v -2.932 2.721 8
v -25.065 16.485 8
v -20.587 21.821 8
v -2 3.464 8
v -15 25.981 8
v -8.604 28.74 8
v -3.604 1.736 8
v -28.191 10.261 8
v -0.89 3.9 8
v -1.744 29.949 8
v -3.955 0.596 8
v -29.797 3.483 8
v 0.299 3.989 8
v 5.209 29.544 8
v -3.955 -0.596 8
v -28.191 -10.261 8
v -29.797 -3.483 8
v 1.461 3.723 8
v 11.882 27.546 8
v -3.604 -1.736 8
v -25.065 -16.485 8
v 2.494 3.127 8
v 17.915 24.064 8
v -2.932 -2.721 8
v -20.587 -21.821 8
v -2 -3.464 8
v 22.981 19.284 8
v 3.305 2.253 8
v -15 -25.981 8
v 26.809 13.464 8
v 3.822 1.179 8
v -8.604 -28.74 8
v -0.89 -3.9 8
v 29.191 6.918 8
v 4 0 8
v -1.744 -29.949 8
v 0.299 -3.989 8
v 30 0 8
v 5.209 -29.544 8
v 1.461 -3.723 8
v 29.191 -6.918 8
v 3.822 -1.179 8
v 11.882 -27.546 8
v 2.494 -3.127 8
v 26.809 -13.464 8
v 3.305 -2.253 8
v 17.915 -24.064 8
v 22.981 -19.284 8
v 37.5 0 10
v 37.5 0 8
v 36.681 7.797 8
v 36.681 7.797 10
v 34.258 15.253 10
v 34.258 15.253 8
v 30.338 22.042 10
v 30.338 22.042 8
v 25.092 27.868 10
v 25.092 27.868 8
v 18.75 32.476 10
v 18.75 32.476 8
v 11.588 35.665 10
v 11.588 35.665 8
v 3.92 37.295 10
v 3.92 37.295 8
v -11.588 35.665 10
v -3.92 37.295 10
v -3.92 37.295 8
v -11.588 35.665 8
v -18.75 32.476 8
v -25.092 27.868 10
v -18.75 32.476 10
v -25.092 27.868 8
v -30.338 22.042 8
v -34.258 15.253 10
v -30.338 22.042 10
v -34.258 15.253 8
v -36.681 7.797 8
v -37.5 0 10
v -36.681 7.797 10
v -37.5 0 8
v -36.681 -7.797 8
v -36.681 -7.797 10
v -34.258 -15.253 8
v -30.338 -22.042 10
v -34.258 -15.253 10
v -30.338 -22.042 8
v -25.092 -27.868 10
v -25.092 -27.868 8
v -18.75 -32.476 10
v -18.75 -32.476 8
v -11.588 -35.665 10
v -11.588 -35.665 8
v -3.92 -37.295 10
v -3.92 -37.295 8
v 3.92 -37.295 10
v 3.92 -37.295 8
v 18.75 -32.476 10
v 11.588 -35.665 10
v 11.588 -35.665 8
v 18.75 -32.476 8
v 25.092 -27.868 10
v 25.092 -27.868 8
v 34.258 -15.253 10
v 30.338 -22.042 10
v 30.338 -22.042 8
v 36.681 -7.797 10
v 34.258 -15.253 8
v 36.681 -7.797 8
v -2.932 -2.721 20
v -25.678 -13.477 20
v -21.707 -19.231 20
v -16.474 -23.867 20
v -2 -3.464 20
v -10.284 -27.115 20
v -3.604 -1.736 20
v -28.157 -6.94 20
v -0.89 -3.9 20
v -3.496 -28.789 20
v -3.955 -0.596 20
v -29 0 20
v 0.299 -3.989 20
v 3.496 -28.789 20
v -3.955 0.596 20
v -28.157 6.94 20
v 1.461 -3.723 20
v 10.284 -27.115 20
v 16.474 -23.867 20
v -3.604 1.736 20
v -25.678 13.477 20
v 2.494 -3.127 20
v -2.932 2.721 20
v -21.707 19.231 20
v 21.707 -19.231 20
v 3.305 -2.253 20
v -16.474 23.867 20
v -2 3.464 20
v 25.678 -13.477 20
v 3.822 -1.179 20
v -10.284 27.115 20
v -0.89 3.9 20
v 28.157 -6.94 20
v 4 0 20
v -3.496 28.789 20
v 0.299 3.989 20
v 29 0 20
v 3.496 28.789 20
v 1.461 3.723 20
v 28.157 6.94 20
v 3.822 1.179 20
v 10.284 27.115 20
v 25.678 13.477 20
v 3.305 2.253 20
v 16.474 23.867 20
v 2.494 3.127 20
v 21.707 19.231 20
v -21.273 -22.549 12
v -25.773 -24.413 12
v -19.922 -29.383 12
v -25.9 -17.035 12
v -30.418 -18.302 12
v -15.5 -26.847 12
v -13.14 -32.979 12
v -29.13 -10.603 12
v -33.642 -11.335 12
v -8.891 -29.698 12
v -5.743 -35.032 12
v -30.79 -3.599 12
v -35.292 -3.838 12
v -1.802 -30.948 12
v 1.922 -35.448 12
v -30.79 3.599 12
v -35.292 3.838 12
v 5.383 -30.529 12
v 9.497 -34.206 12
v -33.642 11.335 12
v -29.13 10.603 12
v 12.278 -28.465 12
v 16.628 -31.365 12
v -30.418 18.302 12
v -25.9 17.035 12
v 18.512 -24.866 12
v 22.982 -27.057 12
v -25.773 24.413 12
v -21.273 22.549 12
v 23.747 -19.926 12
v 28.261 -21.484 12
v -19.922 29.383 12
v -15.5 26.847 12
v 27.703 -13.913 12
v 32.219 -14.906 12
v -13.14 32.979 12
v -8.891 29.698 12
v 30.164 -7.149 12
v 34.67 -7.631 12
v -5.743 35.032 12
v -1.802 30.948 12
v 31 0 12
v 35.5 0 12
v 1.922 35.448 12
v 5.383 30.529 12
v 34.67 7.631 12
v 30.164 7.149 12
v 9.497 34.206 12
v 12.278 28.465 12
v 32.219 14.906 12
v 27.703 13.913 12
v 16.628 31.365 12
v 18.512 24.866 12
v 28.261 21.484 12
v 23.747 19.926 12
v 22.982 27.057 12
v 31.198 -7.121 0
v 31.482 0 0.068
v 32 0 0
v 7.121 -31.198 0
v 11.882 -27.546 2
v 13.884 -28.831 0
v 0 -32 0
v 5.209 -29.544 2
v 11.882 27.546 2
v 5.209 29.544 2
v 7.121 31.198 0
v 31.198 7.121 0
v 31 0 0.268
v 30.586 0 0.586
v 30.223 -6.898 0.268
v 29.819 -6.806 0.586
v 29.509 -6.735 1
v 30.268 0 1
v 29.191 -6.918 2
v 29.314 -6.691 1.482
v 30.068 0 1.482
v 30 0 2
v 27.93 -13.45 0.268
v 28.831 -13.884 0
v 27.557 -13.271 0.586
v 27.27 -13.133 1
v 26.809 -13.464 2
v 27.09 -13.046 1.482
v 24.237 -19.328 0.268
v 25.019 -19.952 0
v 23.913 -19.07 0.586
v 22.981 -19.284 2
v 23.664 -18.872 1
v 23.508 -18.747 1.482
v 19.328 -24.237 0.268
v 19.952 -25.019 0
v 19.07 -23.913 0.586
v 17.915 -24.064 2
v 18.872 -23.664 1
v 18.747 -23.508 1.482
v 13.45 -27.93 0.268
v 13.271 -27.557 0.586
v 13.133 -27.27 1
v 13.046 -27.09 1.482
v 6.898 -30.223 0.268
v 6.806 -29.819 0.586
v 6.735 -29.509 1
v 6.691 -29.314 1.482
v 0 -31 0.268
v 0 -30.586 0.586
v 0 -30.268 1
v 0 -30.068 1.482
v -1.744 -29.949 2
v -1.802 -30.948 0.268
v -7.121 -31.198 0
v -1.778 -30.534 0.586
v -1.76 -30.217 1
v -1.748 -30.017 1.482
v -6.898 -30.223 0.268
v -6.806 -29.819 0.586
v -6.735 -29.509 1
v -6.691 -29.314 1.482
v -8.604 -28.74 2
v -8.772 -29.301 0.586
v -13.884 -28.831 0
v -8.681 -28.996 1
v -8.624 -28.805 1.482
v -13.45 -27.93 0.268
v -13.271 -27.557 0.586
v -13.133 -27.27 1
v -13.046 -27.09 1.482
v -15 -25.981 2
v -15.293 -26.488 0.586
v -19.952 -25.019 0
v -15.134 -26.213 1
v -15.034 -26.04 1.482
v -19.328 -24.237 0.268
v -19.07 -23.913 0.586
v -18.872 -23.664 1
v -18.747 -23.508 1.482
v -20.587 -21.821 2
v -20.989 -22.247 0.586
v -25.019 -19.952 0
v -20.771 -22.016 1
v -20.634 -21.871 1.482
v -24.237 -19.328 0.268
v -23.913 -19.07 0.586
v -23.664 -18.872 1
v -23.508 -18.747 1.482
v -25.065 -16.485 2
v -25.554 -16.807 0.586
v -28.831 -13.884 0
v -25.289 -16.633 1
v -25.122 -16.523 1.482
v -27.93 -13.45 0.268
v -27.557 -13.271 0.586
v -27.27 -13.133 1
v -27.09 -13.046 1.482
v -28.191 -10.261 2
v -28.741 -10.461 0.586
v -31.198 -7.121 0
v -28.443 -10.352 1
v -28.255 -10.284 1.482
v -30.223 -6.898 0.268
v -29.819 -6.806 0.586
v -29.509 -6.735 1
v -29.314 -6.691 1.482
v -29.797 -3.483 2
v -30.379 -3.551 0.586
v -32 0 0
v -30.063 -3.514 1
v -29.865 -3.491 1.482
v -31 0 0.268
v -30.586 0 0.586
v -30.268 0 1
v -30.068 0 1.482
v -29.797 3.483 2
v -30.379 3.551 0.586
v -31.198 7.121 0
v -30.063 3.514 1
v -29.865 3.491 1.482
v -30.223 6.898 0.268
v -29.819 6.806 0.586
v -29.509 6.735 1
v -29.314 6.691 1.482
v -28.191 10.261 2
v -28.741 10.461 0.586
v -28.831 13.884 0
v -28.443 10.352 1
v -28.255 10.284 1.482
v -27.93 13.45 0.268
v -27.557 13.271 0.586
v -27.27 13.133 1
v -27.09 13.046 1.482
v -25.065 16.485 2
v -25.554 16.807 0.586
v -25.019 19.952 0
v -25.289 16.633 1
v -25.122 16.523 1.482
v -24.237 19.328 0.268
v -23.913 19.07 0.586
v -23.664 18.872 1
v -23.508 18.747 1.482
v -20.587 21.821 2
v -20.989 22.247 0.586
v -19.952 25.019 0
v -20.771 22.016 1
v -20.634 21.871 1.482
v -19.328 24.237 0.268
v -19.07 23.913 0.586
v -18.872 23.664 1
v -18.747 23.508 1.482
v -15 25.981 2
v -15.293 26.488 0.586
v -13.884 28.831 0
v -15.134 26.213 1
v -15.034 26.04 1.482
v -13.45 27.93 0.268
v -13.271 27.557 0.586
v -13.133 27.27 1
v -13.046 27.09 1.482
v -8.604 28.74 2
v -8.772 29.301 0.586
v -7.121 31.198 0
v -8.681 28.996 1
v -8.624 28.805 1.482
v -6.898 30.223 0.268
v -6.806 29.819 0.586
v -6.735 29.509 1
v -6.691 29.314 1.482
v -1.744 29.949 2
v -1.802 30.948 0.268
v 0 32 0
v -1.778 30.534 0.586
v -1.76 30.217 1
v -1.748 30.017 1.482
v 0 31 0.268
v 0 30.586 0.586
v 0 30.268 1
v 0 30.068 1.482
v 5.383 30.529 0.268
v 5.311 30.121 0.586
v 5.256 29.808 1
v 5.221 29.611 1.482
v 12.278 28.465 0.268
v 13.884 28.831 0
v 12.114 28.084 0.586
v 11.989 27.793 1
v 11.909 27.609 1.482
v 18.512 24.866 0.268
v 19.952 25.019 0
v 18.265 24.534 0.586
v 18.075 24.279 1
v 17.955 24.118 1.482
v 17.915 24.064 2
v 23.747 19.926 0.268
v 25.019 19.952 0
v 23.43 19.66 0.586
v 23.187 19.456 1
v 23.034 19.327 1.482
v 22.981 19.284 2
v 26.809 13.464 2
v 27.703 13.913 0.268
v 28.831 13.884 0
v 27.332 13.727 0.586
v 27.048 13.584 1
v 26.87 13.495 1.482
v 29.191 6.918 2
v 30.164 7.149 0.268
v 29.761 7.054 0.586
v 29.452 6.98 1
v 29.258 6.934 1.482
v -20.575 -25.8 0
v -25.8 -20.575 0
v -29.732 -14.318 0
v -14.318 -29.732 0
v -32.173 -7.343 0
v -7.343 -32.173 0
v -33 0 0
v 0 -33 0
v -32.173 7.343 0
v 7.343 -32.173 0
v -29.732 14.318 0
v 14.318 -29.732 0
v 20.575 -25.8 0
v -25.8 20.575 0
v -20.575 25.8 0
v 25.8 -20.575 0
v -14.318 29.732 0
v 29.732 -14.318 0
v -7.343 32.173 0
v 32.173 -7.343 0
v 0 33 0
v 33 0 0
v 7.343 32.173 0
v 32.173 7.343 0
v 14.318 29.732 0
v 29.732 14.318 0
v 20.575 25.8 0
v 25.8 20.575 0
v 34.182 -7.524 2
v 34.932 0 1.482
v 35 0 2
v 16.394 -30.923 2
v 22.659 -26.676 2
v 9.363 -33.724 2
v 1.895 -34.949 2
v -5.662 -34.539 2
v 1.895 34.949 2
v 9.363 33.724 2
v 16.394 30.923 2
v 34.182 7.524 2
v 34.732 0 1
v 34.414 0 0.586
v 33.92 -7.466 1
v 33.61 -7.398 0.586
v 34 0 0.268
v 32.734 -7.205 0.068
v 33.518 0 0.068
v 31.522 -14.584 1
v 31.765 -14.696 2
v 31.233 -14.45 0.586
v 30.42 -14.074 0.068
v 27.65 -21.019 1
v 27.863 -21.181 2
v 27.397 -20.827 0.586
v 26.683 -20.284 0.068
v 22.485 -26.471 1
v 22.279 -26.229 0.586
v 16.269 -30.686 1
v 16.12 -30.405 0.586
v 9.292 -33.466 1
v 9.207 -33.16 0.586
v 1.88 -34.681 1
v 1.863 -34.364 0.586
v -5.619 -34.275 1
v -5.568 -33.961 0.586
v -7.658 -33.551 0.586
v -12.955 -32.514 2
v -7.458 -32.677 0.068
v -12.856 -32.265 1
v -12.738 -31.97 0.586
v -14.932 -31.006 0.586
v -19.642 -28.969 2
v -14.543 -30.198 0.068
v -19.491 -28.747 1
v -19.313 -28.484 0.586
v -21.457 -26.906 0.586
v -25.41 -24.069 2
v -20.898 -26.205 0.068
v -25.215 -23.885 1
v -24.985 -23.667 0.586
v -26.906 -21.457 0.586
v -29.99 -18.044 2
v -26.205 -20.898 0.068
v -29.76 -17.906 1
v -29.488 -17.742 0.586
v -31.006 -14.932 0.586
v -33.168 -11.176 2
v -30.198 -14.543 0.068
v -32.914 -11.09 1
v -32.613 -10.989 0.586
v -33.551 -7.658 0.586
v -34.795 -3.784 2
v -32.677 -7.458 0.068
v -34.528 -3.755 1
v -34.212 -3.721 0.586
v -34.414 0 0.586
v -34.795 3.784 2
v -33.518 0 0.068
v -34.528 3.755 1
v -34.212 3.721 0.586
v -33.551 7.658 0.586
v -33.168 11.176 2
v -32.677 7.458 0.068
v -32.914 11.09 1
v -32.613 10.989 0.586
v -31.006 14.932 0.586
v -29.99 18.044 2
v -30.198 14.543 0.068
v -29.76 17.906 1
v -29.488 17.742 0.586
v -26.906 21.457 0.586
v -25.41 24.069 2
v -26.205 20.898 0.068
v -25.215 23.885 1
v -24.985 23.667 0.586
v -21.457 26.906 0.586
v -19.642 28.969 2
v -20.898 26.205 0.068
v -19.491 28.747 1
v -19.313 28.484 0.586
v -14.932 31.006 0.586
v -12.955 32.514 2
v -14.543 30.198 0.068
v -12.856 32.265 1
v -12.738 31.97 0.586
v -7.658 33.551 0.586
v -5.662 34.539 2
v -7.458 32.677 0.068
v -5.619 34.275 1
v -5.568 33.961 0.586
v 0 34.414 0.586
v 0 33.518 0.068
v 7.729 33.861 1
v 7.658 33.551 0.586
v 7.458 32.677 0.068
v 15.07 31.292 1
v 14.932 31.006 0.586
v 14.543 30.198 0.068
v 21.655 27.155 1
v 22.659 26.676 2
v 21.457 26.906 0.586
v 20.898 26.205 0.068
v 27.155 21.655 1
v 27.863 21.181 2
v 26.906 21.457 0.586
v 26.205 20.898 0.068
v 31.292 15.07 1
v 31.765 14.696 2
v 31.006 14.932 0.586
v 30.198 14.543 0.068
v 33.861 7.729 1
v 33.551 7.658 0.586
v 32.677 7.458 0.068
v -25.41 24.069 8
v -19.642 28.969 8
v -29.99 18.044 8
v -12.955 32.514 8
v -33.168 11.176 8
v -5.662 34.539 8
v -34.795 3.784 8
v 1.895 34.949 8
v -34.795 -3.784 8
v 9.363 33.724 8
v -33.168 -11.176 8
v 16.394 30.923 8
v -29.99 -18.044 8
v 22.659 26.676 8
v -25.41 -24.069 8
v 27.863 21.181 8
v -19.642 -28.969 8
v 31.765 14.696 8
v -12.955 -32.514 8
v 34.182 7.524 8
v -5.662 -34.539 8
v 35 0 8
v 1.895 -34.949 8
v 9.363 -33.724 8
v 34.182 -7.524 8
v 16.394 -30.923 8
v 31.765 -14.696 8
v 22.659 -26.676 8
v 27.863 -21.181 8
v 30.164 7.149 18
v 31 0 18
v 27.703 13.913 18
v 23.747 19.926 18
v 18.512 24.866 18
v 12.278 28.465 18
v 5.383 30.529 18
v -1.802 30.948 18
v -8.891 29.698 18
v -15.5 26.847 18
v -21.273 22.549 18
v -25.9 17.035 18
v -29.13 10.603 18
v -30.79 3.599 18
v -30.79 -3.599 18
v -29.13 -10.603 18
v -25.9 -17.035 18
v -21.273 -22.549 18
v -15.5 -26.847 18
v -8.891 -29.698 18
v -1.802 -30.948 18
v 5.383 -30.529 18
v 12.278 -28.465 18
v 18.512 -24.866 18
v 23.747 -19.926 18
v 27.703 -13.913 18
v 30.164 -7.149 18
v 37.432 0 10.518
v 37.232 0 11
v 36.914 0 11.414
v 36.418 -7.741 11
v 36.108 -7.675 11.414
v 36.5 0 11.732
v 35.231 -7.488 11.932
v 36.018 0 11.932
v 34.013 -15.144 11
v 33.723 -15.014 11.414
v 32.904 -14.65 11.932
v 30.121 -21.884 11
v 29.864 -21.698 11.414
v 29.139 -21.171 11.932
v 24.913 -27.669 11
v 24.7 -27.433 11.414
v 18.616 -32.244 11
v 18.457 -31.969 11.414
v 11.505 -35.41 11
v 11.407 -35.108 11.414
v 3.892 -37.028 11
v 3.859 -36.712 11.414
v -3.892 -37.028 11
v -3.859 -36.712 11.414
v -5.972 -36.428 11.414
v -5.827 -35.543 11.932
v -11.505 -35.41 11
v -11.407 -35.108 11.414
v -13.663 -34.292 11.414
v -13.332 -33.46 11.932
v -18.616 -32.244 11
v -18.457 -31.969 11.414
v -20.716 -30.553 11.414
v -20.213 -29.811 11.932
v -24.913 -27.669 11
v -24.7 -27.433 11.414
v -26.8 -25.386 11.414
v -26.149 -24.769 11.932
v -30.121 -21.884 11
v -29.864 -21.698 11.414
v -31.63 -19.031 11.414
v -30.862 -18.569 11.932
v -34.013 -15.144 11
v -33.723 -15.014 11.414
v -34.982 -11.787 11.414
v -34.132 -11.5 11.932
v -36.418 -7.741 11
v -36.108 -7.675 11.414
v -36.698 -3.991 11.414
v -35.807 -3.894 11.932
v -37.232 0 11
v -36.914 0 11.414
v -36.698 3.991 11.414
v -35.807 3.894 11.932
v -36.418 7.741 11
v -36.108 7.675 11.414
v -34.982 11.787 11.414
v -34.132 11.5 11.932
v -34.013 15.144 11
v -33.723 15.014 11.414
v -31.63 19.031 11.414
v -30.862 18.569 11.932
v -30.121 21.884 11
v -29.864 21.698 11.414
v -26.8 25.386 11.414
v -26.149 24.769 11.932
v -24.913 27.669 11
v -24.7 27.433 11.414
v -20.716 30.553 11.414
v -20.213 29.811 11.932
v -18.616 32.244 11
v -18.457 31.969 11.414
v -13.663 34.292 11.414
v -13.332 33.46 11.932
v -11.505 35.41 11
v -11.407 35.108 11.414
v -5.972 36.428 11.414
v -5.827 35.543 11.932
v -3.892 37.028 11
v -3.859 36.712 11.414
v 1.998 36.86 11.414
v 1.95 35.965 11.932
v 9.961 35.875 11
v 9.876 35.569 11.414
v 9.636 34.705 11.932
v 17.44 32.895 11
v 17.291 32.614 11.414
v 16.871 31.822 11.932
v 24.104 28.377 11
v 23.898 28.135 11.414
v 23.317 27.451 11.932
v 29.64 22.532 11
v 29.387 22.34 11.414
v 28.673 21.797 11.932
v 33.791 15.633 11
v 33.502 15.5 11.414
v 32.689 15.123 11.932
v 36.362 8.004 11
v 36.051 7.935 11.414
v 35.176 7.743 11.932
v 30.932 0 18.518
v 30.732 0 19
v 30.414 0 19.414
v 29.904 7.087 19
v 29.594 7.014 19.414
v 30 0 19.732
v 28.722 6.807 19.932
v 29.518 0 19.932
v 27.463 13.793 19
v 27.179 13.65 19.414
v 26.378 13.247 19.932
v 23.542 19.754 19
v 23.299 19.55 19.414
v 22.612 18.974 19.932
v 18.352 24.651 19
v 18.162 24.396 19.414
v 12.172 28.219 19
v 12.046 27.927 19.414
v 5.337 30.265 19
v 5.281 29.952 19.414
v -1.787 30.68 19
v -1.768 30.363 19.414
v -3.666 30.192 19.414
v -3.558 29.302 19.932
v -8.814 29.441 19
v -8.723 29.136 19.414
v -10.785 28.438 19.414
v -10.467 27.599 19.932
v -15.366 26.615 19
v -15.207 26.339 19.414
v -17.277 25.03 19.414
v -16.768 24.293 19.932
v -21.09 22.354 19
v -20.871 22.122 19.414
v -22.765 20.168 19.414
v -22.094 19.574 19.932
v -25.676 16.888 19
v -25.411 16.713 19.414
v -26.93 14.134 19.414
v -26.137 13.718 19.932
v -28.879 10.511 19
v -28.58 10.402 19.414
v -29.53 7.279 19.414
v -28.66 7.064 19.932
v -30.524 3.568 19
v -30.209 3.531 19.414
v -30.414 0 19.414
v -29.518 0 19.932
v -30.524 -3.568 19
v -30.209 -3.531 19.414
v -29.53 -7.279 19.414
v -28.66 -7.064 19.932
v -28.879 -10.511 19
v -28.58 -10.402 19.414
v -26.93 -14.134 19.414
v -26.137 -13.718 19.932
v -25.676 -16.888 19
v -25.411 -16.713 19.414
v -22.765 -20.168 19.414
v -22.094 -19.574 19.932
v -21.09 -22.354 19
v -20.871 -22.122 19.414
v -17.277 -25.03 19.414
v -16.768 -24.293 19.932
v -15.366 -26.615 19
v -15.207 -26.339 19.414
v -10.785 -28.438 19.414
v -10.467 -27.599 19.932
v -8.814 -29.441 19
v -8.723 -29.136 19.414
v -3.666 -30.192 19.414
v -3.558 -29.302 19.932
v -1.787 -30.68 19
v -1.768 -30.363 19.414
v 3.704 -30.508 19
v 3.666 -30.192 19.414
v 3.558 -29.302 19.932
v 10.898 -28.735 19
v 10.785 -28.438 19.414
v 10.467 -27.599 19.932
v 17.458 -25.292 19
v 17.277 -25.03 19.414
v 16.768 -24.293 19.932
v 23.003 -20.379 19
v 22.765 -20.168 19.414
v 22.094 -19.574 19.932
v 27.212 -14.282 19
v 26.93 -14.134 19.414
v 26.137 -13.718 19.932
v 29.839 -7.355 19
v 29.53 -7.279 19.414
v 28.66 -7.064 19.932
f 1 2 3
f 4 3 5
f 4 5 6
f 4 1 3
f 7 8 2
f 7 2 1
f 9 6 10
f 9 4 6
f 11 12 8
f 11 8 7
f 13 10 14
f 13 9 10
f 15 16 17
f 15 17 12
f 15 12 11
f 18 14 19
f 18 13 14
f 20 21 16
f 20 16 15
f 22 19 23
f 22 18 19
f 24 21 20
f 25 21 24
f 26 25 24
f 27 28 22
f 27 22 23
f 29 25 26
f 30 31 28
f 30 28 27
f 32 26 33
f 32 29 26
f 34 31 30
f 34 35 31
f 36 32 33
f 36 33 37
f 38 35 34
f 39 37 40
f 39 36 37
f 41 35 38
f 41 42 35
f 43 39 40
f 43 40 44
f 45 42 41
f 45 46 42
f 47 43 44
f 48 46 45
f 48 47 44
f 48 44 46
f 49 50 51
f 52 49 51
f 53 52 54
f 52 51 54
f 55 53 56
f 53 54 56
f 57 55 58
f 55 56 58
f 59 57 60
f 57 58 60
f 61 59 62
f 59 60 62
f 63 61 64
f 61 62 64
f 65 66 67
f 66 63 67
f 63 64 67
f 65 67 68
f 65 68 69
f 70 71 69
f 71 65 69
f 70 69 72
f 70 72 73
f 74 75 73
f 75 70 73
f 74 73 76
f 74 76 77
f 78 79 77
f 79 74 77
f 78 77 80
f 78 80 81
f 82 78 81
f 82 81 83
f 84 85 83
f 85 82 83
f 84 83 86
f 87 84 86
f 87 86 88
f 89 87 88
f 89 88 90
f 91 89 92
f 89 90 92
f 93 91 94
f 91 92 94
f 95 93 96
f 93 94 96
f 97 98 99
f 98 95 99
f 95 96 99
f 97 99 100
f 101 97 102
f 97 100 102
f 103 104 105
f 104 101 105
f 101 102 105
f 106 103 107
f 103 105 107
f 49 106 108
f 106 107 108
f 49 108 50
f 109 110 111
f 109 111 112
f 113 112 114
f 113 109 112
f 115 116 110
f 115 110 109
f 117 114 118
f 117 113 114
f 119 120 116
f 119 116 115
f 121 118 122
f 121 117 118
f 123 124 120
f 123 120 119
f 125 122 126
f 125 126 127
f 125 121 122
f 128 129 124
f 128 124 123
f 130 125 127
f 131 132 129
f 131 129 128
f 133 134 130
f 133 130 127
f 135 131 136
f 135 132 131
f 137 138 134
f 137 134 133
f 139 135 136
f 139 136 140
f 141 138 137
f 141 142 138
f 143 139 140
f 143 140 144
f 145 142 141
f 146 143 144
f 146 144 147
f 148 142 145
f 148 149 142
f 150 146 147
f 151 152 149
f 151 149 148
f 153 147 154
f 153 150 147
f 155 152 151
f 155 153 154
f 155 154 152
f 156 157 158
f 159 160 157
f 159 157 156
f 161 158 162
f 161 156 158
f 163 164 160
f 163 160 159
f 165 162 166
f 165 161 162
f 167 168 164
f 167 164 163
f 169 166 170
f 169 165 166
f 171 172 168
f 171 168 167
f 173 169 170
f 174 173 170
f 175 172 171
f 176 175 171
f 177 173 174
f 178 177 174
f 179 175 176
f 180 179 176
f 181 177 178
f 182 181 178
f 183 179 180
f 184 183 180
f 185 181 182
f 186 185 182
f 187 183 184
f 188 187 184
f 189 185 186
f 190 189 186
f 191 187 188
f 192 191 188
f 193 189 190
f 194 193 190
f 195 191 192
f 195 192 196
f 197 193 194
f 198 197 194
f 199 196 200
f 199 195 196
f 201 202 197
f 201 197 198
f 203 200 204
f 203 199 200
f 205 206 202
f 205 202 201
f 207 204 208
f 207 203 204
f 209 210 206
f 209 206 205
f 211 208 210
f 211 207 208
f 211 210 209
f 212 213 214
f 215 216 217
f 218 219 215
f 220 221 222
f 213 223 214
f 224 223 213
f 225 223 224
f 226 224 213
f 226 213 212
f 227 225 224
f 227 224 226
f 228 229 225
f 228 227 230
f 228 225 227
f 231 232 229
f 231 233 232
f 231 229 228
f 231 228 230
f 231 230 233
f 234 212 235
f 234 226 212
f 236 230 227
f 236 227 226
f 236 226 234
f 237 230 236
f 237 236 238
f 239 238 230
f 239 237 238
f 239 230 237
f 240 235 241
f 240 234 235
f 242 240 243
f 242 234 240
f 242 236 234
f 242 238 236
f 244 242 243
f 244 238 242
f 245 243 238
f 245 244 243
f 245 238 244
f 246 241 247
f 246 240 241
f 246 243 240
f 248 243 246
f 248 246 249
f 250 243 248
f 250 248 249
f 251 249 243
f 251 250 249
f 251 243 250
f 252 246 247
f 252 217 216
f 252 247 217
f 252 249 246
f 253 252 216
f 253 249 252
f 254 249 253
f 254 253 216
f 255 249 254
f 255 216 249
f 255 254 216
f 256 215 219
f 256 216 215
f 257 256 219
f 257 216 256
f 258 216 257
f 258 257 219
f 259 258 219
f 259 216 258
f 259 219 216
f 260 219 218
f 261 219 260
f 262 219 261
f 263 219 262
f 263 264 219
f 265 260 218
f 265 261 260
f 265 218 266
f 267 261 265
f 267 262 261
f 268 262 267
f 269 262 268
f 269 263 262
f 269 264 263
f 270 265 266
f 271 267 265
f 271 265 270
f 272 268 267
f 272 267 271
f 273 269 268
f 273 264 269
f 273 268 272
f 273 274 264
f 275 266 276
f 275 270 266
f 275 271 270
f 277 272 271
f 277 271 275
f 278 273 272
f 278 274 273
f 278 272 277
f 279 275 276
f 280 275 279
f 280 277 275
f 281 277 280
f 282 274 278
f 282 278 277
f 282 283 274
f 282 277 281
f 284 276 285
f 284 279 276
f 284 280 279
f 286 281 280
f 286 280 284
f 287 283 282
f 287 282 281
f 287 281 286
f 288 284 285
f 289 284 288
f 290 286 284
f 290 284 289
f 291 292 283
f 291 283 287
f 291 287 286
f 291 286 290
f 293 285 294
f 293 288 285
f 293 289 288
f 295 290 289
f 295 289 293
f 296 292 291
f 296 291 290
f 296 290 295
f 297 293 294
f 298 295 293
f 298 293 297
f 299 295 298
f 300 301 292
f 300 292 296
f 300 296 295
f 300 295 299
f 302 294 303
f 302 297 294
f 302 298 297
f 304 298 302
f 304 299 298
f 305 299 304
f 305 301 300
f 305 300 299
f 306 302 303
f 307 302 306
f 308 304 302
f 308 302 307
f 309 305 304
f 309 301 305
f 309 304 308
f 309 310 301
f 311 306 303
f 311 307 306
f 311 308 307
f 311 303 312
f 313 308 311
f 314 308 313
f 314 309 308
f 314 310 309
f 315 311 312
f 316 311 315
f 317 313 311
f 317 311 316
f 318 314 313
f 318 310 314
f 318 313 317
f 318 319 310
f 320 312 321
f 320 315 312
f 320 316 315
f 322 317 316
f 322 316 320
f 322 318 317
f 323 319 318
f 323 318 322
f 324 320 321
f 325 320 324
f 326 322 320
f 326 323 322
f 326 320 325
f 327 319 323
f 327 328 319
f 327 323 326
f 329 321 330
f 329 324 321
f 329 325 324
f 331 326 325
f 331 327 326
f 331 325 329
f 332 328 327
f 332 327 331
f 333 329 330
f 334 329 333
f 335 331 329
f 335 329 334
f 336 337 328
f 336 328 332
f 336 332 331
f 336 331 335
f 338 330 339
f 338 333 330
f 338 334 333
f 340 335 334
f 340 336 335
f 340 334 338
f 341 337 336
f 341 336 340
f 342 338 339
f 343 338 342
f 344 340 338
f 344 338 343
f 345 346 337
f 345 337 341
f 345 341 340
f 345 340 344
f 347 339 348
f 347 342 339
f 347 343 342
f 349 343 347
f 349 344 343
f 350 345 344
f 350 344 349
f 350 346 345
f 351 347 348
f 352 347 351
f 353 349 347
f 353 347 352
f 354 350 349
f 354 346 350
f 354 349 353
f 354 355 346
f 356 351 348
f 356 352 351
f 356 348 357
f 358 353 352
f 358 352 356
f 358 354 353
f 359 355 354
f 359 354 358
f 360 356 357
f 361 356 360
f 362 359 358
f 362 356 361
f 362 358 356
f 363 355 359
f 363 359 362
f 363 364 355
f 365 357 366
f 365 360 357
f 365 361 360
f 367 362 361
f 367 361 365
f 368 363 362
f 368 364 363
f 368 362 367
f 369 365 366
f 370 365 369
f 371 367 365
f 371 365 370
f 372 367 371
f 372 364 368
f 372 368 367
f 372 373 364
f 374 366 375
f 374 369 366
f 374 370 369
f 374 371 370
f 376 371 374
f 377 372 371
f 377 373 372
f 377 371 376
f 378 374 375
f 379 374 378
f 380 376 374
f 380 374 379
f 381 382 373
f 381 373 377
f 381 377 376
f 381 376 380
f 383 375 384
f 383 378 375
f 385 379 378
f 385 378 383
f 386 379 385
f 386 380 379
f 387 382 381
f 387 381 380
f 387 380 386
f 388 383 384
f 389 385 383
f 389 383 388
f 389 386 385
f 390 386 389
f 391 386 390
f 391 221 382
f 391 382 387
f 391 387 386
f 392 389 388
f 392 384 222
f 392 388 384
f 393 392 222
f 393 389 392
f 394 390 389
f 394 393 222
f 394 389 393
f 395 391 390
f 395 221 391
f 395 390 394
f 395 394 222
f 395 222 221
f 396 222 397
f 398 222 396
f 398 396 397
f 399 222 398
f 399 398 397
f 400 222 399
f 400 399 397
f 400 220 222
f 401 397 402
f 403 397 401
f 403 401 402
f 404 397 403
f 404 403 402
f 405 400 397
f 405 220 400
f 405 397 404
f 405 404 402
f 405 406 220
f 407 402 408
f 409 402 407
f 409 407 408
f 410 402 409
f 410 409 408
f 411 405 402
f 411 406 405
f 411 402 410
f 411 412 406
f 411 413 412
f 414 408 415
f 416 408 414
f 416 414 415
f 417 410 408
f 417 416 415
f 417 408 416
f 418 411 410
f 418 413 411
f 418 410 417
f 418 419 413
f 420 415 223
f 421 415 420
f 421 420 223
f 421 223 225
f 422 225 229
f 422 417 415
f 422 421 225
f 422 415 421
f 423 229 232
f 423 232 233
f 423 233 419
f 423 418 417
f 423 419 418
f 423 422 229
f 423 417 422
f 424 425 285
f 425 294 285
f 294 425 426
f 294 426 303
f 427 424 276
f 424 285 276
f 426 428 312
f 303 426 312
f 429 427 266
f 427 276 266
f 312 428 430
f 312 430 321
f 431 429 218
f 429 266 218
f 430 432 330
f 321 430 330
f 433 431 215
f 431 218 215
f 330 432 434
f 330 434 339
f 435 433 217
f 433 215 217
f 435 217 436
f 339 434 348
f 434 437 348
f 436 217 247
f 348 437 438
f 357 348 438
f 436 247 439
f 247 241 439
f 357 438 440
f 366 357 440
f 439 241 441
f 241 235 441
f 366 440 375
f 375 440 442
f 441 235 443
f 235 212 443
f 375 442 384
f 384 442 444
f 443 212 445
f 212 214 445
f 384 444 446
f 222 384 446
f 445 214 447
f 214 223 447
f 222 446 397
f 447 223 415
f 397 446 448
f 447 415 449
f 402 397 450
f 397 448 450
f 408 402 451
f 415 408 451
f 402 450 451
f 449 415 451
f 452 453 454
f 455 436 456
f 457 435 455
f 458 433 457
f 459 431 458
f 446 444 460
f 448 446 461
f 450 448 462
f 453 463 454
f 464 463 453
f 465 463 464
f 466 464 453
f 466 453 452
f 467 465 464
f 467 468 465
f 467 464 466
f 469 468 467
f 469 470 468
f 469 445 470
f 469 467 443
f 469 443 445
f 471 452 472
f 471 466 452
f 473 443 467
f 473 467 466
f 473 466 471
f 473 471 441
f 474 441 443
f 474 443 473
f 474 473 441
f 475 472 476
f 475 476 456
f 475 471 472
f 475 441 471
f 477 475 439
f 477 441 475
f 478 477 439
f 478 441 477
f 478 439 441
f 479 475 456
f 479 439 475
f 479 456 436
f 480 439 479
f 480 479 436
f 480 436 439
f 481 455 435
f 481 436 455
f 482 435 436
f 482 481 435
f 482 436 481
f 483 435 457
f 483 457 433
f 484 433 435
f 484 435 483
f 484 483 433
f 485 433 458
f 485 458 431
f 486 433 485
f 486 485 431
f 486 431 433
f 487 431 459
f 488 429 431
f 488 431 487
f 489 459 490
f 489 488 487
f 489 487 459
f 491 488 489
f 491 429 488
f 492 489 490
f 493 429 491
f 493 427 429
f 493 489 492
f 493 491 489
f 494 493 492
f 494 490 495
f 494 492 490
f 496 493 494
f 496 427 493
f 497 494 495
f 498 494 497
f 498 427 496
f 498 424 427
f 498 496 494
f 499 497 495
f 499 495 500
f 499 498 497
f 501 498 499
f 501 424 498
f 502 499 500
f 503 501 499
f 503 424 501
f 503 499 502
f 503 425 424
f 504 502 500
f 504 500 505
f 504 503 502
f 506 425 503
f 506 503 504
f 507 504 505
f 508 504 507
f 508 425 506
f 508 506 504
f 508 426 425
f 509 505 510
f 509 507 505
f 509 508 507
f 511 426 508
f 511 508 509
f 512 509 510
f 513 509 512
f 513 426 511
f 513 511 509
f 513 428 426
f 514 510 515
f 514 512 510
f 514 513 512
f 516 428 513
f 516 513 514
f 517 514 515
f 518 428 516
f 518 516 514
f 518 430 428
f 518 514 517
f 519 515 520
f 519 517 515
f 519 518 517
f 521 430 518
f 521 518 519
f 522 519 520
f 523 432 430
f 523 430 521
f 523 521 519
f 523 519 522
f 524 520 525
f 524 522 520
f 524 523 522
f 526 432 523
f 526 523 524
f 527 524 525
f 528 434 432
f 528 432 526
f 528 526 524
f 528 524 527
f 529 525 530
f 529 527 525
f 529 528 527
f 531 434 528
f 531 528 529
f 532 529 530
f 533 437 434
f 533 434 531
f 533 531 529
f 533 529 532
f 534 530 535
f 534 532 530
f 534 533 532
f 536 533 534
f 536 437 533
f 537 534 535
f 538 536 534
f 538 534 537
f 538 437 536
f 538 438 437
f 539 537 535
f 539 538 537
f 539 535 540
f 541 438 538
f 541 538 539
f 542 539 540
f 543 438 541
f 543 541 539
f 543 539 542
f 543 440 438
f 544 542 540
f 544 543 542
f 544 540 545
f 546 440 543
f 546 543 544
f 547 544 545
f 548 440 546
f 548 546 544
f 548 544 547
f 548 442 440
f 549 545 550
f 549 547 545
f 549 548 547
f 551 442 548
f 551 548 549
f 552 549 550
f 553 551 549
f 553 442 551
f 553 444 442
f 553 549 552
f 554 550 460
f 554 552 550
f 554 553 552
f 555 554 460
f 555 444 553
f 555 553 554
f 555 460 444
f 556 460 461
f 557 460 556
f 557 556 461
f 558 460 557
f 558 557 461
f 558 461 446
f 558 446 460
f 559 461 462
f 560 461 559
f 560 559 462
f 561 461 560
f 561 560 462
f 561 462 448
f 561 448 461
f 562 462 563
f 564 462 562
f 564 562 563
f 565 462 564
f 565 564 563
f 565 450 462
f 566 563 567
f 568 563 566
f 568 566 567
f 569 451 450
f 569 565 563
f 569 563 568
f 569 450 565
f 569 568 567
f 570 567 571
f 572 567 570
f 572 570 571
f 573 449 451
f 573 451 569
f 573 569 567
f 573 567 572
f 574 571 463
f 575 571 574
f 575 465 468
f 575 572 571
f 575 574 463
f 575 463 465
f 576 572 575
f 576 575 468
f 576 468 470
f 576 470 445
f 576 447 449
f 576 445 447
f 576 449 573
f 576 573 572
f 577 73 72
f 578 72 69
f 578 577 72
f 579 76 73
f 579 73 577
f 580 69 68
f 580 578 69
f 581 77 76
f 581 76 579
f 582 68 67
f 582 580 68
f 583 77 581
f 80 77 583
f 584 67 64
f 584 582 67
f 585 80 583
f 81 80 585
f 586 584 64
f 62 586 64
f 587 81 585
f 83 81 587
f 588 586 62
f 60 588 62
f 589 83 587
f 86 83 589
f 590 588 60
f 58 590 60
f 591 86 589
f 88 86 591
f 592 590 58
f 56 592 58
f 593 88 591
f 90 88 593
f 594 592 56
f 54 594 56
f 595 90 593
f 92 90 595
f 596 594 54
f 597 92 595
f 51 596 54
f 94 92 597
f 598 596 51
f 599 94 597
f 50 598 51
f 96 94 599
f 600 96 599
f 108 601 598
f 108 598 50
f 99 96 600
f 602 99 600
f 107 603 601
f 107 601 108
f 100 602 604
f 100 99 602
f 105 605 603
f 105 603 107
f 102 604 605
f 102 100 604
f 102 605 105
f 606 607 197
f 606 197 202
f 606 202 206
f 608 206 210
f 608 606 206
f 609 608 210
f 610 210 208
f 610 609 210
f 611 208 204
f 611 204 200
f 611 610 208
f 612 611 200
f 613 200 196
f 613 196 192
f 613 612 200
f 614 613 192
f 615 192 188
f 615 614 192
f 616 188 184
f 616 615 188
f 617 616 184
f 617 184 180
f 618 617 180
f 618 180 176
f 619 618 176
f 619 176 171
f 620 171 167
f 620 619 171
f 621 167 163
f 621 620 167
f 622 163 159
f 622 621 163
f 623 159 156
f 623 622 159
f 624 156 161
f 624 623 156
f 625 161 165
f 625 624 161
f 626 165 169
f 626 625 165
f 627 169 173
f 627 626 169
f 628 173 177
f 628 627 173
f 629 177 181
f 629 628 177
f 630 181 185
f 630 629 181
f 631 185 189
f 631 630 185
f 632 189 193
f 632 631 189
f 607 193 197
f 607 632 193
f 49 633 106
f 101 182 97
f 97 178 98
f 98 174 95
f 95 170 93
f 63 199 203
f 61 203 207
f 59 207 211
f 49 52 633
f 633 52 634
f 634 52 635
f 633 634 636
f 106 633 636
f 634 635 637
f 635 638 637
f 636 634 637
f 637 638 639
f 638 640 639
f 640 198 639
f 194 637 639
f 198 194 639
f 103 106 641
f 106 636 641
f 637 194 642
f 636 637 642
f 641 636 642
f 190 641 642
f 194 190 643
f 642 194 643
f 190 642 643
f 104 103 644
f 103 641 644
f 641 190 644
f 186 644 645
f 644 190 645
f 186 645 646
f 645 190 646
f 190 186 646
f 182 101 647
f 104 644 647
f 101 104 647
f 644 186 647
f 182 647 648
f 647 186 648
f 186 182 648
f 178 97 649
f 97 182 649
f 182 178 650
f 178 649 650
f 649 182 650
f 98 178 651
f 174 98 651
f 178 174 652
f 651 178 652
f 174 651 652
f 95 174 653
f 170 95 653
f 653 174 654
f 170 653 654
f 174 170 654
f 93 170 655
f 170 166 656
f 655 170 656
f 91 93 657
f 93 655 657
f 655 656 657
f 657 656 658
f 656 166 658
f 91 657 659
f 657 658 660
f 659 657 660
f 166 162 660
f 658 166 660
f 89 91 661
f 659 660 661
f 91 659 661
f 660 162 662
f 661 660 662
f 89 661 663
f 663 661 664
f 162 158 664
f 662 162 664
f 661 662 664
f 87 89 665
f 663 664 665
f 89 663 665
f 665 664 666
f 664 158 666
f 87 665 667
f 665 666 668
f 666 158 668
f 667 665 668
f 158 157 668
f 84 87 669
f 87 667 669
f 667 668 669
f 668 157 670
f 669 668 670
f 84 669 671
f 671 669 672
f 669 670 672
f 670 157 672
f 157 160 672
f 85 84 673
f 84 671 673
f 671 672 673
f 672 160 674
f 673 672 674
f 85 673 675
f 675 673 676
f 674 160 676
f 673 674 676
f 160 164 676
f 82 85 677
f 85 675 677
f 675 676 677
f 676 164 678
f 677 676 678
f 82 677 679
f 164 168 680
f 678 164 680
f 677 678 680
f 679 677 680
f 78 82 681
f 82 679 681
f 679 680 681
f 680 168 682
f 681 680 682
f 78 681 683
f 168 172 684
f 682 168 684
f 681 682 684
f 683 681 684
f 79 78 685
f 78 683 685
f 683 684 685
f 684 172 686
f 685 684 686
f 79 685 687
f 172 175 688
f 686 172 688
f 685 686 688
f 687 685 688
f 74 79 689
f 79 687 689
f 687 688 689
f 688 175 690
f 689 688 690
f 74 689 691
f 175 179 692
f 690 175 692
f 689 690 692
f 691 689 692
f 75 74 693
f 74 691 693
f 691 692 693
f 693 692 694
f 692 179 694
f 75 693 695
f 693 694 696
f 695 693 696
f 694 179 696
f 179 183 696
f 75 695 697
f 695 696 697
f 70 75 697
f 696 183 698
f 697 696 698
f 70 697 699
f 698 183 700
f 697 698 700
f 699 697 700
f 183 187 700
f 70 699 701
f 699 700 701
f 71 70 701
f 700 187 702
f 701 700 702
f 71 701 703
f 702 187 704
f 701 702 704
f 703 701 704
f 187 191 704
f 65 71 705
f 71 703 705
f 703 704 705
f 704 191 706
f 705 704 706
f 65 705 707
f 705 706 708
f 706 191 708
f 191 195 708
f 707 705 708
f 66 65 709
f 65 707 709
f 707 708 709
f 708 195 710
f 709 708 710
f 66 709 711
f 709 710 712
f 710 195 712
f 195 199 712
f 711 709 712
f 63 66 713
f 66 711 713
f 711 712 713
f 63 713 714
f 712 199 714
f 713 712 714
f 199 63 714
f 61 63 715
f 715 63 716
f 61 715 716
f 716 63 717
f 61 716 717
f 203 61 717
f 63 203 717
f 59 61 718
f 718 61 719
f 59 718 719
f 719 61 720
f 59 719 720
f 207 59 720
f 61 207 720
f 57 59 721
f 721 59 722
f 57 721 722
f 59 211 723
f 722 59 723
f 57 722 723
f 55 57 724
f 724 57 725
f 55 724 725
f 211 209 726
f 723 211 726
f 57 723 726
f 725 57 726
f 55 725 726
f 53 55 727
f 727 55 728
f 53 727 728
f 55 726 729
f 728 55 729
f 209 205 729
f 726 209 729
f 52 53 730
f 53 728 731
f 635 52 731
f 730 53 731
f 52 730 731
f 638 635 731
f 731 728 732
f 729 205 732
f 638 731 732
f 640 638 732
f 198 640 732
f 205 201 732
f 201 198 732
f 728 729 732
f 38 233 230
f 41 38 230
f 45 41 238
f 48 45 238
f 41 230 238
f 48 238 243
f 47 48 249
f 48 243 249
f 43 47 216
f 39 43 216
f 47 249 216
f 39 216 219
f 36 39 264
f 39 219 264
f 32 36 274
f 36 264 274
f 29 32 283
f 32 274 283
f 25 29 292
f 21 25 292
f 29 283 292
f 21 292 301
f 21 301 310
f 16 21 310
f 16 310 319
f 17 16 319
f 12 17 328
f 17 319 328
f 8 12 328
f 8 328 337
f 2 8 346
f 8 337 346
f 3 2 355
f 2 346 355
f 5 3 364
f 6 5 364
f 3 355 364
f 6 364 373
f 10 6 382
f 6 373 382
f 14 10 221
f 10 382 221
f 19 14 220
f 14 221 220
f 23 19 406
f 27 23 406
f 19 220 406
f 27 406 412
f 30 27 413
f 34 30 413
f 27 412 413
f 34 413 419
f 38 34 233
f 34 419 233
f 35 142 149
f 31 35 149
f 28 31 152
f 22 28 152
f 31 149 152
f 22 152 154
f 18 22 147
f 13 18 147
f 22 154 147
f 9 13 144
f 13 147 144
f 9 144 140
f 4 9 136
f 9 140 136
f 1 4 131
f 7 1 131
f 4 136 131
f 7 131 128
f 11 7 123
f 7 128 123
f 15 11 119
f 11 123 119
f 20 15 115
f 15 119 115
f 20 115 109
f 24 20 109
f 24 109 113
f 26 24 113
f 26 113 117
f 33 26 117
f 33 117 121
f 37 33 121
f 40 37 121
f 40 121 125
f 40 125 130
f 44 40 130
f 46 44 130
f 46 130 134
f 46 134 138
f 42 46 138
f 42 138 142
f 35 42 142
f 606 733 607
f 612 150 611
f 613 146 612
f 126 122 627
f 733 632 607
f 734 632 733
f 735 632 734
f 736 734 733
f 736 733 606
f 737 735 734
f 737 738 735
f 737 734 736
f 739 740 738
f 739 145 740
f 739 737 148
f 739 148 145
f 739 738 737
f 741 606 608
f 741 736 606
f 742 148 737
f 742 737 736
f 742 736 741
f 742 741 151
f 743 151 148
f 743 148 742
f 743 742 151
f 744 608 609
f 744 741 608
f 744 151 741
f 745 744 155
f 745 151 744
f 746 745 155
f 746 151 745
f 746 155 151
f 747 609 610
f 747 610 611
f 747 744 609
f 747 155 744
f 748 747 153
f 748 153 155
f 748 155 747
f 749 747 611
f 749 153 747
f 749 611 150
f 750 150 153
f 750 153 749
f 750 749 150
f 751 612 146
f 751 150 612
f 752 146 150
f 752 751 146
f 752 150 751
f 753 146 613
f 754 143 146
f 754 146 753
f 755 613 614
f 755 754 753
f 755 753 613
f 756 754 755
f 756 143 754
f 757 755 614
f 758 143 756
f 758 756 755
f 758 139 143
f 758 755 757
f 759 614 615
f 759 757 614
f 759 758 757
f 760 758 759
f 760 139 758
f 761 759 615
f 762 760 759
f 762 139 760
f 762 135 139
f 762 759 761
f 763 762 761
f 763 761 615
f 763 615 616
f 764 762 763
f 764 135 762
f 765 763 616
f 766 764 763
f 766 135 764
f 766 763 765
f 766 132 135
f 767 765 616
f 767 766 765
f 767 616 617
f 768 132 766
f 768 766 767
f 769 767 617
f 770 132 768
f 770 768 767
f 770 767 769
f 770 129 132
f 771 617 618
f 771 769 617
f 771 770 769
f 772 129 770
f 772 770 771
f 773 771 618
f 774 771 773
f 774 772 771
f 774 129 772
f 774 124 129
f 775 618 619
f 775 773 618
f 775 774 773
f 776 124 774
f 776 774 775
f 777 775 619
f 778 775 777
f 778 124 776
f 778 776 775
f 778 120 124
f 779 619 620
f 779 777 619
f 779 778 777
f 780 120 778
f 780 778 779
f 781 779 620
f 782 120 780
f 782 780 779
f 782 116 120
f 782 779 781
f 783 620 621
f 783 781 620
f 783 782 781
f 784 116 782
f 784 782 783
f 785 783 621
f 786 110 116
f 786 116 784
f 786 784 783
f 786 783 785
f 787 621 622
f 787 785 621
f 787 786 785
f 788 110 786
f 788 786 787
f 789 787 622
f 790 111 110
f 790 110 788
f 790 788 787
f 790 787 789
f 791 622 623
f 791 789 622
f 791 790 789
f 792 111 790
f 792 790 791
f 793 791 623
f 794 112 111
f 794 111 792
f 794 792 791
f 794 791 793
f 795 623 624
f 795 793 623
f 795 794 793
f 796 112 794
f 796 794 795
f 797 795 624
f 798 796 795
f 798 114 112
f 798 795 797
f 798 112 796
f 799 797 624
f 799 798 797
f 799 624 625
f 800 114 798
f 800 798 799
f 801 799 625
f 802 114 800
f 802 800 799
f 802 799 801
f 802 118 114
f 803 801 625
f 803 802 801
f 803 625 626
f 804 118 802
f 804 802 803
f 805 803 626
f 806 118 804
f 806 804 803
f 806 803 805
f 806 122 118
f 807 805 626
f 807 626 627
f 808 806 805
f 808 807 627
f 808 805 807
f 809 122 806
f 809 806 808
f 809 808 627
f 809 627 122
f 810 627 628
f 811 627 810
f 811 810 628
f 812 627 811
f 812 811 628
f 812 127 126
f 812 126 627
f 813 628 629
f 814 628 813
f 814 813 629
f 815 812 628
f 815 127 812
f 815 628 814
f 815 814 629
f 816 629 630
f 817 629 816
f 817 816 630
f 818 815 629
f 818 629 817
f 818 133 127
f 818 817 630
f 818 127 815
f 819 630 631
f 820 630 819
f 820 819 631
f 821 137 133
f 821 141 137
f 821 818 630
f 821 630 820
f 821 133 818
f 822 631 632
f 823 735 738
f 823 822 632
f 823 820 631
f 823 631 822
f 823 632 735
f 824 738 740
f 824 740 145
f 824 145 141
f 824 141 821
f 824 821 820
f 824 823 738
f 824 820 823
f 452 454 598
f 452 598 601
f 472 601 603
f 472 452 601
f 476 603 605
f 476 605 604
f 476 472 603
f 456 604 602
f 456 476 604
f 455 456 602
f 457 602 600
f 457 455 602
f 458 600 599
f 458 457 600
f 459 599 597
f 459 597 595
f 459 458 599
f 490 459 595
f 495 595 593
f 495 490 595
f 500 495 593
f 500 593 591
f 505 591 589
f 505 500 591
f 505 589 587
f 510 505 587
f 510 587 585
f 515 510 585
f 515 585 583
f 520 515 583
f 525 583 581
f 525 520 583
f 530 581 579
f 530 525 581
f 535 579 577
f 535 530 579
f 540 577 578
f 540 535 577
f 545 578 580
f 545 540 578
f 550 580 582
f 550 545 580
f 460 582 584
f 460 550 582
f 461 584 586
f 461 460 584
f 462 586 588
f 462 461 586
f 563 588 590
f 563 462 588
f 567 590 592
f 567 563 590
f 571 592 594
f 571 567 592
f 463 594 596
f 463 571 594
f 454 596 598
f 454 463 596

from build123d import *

# Parameters (mm, degrees)
SKETCH_R        = 37.5
PAD_DEPTH       = 20
SKETCH001_R     = 41.795257
SKETCH001_R_2   = 31
POCKET_DEPTH    = 8
SKETCH002_R     = 43.633229
SKETCH002_R_2   = 35
POCKET001_DEPTH = 8
SKETCH003_R     = 30
POCKET002_DEPTH = 8
SKETCH004_R     = 4
POCKET003_DEPTH = 20
FILLET_R        = 2


with BuildPart() as part:
    # Sketch → Pad (new body)
    with BuildSketch(Plane.XY):
        Circle(SKETCH_R)
    extrude(amount=PAD_DEPTH)

    # Sketch001 (on Face3 of Pad) → Pocket (cut)
    with BuildSketch(Plane.XY.offset(20)):
        Circle(SKETCH001_R)
        Circle(SKETCH001_R_2, mode=Mode.SUBTRACT)
    extrude(amount=-POCKET_DEPTH, mode=Mode.SUBTRACT)

    # Sketch002 (on Face2 of Pocket) → Pocket001 (cut)
    with BuildSketch(Plane(origin=(0, 0, 0), x_dir=(1, 0, 0), z_dir=(0, 0, -1))):
        Circle(SKETCH002_R)
        Circle(SKETCH002_R_2, mode=Mode.SUBTRACT)
    extrude(amount=-POCKET001_DEPTH, mode=Mode.SUBTRACT)

    # Sketch003 (on Face6 of Pocket001) → Pocket002 (cut)
    with BuildSketch(Plane(origin=(0, 0, 0), x_dir=(1, 0, 0), z_dir=(0, 0, -1))):
        Circle(SKETCH003_R)
    extrude(amount=-POCKET002_DEPTH, mode=Mode.SUBTRACT)

    # Sketch004 (on Face7 of Pocket002) → Pocket003 (cut)
    with BuildSketch(Plane.XY.offset(20)):
        Circle(SKETCH004_R)
    extrude(amount=-POCKET003_DEPTH, mode=Mode.SUBTRACT)

    # Fillet
    fillet_edges = [part.edges().sort_by_distance(p)[0] for p in [
        (-31, 0, 20),
        (-37.5, 0, 12),
        (-30, 0, 0),
        (-35, 0, 0),
    ]]
    fillet(fillet_edges, radius=FILLET_R)


solid = part.part
